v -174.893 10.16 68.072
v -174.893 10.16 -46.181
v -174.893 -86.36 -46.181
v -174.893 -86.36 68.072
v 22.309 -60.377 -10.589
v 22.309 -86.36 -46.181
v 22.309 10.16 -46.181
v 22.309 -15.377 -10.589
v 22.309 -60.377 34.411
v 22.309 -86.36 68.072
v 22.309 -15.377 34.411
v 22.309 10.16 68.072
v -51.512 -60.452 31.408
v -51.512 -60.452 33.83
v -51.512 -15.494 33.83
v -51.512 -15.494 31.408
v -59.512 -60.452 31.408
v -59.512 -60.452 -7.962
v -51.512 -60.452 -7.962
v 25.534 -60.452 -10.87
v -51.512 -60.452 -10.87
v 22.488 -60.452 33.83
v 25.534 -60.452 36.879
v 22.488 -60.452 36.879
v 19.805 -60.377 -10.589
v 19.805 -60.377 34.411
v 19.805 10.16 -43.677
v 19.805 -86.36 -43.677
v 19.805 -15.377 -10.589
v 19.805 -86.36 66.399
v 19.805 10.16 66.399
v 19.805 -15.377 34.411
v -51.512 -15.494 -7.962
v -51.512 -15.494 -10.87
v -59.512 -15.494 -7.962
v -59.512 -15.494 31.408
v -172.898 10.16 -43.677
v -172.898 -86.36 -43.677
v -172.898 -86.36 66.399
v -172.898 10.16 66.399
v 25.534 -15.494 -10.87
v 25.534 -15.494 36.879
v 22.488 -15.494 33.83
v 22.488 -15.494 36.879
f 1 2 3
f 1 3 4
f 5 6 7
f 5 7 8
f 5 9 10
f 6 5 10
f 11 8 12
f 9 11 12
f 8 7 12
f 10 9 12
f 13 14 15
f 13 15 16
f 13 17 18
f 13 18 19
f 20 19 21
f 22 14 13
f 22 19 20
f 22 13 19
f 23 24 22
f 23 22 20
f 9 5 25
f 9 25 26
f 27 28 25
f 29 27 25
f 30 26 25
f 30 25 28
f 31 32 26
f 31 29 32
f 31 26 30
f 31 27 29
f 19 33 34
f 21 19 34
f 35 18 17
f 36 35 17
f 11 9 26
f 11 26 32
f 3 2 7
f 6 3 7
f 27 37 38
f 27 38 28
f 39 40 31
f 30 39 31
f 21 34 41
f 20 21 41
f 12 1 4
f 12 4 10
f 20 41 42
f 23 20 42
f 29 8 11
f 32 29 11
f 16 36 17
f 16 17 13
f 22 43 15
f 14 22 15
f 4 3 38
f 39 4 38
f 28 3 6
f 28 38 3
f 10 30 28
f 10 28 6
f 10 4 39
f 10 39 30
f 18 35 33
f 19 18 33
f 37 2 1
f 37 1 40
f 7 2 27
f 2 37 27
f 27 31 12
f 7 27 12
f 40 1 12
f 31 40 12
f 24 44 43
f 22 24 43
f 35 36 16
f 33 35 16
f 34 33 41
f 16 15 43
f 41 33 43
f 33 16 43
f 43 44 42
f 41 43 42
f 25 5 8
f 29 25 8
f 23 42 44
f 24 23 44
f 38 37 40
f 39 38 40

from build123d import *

# Parameters (mm, degrees)
F0_W      = 8
F0_H      = 39.37
F1_DEPTH  = 45
F2_W      = 200
F2_H      = 90
F2_W_2    = 196.1686834693
F2_H_2    = 85.9658196568
F3_DEPTH  = 120
F5_DEPTH  = 44.958
F7_W      = 197.2026191652
F7_H      = 114.2523102462
F7_W_2    = 192.7037164569
F7_H_2    = 110.0756414235
F8_DEPTH  = 96.52
F10_W     = 45
F10_H     = 45
F11_DEPTH = 25.4


with BuildPart() as f1:
    # F0 (on Front) → F1 (new body)
    with BuildSketch(Plane.XZ):
        Polygon((22.4877819419, 9.1920092247), (-51.5122180581, 9.1920092247), (-51.5122180581, 6.7698132348), (-51.5122180581, -32.6001867652), (-51.5122180581, -35.5079907753), (22.4877819419, -35.5079907753), align=None)
        with Locations((-55.5122180581, -12.9151867652)):
            Rectangle(F0_W, F0_H)
        Polygon((22.4877819419, 12.2407088056), (22.4877819419, 9.1920092247), (22.4877819419, -35.5079907753), (25.5342535675, -35.5079907753), (25.5342535675, 12.2407088056), align=None)
    extrude(amount=F1_DEPTH)

    # F2 (on Front) → F3 (join)
    with BuildSketch(Plane.XZ):
        with Locations((-77.9414363205, -12.331022647)):
            Rectangle(F2_W, F2_H)
        with Locations((-77.8260696679, -12.3739996925)):
            Rectangle(F2_W_2, F2_H_2, mode=Mode.SUBTRACT)
    extrude(amount=F3_DEPTH)


with BuildPart() as f1_1:
    # F4: moved
    add(f1.part.moved(Location((0, 20.574, 0))))


with BuildPart() as f5:
    # F0 (on Front) → F5 (new body)
    with BuildSketch(Plane.XZ):
        Polygon((22.4877819419, 9.1920092247), (-51.5122180581, 9.1920092247), (-51.5122180581, 6.7698132348), (-51.5122180581, -32.6001867652), (-51.5122180581, -35.5079907753), (22.4877819419, -35.5079907753), align=None)
        Polygon((22.4877819419, 12.2407088056), (22.4877819419, 9.1920092247), (22.4877819419, -35.5079907753), (25.5342535675, -35.5079907753), (25.5342535675, 12.2407088056), align=None)
        with Locations((-55.5122180581, -12.9151867652)):
            Rectangle(F0_W, F0_H)
    extrude(amount=F5_DEPTH)


with BuildPart() as f8:
    # F7 (on Front) → F8 (new body)
    with BuildSketch(Plane.XZ):
        with Locations((-76.2919057161, 10.9453741461)):
            Rectangle(F7_W, F7_H)
        with Locations((-76.546613127, 11.3612022251)):
            Rectangle(F7_W_2, F7_H_2, mode=Mode.SUBTRACT)
    extrude(amount=F8_DEPTH)


with BuildPart() as f8_1:
    # F9: moved
    add(f8.part.moved(Location((0, 10.16, 0))))

    # F10 (on face) → F11 (cut)
    with BuildSketch(Plane.YZ.offset(22.3094038665)):
        with Locations((-37.8774991259, 11.9105134565)):
            Rectangle(F10_W, F10_H)
    extrude(amount=-F11_DEPTH, mode=Mode.SUBTRACT)


with BuildPart() as f5_1:
    # F12: moved
    add(f5.part.moved(Location((0, -15.494, 24.638))))


solid = Compound([f8_1.part, f5_1.part])
